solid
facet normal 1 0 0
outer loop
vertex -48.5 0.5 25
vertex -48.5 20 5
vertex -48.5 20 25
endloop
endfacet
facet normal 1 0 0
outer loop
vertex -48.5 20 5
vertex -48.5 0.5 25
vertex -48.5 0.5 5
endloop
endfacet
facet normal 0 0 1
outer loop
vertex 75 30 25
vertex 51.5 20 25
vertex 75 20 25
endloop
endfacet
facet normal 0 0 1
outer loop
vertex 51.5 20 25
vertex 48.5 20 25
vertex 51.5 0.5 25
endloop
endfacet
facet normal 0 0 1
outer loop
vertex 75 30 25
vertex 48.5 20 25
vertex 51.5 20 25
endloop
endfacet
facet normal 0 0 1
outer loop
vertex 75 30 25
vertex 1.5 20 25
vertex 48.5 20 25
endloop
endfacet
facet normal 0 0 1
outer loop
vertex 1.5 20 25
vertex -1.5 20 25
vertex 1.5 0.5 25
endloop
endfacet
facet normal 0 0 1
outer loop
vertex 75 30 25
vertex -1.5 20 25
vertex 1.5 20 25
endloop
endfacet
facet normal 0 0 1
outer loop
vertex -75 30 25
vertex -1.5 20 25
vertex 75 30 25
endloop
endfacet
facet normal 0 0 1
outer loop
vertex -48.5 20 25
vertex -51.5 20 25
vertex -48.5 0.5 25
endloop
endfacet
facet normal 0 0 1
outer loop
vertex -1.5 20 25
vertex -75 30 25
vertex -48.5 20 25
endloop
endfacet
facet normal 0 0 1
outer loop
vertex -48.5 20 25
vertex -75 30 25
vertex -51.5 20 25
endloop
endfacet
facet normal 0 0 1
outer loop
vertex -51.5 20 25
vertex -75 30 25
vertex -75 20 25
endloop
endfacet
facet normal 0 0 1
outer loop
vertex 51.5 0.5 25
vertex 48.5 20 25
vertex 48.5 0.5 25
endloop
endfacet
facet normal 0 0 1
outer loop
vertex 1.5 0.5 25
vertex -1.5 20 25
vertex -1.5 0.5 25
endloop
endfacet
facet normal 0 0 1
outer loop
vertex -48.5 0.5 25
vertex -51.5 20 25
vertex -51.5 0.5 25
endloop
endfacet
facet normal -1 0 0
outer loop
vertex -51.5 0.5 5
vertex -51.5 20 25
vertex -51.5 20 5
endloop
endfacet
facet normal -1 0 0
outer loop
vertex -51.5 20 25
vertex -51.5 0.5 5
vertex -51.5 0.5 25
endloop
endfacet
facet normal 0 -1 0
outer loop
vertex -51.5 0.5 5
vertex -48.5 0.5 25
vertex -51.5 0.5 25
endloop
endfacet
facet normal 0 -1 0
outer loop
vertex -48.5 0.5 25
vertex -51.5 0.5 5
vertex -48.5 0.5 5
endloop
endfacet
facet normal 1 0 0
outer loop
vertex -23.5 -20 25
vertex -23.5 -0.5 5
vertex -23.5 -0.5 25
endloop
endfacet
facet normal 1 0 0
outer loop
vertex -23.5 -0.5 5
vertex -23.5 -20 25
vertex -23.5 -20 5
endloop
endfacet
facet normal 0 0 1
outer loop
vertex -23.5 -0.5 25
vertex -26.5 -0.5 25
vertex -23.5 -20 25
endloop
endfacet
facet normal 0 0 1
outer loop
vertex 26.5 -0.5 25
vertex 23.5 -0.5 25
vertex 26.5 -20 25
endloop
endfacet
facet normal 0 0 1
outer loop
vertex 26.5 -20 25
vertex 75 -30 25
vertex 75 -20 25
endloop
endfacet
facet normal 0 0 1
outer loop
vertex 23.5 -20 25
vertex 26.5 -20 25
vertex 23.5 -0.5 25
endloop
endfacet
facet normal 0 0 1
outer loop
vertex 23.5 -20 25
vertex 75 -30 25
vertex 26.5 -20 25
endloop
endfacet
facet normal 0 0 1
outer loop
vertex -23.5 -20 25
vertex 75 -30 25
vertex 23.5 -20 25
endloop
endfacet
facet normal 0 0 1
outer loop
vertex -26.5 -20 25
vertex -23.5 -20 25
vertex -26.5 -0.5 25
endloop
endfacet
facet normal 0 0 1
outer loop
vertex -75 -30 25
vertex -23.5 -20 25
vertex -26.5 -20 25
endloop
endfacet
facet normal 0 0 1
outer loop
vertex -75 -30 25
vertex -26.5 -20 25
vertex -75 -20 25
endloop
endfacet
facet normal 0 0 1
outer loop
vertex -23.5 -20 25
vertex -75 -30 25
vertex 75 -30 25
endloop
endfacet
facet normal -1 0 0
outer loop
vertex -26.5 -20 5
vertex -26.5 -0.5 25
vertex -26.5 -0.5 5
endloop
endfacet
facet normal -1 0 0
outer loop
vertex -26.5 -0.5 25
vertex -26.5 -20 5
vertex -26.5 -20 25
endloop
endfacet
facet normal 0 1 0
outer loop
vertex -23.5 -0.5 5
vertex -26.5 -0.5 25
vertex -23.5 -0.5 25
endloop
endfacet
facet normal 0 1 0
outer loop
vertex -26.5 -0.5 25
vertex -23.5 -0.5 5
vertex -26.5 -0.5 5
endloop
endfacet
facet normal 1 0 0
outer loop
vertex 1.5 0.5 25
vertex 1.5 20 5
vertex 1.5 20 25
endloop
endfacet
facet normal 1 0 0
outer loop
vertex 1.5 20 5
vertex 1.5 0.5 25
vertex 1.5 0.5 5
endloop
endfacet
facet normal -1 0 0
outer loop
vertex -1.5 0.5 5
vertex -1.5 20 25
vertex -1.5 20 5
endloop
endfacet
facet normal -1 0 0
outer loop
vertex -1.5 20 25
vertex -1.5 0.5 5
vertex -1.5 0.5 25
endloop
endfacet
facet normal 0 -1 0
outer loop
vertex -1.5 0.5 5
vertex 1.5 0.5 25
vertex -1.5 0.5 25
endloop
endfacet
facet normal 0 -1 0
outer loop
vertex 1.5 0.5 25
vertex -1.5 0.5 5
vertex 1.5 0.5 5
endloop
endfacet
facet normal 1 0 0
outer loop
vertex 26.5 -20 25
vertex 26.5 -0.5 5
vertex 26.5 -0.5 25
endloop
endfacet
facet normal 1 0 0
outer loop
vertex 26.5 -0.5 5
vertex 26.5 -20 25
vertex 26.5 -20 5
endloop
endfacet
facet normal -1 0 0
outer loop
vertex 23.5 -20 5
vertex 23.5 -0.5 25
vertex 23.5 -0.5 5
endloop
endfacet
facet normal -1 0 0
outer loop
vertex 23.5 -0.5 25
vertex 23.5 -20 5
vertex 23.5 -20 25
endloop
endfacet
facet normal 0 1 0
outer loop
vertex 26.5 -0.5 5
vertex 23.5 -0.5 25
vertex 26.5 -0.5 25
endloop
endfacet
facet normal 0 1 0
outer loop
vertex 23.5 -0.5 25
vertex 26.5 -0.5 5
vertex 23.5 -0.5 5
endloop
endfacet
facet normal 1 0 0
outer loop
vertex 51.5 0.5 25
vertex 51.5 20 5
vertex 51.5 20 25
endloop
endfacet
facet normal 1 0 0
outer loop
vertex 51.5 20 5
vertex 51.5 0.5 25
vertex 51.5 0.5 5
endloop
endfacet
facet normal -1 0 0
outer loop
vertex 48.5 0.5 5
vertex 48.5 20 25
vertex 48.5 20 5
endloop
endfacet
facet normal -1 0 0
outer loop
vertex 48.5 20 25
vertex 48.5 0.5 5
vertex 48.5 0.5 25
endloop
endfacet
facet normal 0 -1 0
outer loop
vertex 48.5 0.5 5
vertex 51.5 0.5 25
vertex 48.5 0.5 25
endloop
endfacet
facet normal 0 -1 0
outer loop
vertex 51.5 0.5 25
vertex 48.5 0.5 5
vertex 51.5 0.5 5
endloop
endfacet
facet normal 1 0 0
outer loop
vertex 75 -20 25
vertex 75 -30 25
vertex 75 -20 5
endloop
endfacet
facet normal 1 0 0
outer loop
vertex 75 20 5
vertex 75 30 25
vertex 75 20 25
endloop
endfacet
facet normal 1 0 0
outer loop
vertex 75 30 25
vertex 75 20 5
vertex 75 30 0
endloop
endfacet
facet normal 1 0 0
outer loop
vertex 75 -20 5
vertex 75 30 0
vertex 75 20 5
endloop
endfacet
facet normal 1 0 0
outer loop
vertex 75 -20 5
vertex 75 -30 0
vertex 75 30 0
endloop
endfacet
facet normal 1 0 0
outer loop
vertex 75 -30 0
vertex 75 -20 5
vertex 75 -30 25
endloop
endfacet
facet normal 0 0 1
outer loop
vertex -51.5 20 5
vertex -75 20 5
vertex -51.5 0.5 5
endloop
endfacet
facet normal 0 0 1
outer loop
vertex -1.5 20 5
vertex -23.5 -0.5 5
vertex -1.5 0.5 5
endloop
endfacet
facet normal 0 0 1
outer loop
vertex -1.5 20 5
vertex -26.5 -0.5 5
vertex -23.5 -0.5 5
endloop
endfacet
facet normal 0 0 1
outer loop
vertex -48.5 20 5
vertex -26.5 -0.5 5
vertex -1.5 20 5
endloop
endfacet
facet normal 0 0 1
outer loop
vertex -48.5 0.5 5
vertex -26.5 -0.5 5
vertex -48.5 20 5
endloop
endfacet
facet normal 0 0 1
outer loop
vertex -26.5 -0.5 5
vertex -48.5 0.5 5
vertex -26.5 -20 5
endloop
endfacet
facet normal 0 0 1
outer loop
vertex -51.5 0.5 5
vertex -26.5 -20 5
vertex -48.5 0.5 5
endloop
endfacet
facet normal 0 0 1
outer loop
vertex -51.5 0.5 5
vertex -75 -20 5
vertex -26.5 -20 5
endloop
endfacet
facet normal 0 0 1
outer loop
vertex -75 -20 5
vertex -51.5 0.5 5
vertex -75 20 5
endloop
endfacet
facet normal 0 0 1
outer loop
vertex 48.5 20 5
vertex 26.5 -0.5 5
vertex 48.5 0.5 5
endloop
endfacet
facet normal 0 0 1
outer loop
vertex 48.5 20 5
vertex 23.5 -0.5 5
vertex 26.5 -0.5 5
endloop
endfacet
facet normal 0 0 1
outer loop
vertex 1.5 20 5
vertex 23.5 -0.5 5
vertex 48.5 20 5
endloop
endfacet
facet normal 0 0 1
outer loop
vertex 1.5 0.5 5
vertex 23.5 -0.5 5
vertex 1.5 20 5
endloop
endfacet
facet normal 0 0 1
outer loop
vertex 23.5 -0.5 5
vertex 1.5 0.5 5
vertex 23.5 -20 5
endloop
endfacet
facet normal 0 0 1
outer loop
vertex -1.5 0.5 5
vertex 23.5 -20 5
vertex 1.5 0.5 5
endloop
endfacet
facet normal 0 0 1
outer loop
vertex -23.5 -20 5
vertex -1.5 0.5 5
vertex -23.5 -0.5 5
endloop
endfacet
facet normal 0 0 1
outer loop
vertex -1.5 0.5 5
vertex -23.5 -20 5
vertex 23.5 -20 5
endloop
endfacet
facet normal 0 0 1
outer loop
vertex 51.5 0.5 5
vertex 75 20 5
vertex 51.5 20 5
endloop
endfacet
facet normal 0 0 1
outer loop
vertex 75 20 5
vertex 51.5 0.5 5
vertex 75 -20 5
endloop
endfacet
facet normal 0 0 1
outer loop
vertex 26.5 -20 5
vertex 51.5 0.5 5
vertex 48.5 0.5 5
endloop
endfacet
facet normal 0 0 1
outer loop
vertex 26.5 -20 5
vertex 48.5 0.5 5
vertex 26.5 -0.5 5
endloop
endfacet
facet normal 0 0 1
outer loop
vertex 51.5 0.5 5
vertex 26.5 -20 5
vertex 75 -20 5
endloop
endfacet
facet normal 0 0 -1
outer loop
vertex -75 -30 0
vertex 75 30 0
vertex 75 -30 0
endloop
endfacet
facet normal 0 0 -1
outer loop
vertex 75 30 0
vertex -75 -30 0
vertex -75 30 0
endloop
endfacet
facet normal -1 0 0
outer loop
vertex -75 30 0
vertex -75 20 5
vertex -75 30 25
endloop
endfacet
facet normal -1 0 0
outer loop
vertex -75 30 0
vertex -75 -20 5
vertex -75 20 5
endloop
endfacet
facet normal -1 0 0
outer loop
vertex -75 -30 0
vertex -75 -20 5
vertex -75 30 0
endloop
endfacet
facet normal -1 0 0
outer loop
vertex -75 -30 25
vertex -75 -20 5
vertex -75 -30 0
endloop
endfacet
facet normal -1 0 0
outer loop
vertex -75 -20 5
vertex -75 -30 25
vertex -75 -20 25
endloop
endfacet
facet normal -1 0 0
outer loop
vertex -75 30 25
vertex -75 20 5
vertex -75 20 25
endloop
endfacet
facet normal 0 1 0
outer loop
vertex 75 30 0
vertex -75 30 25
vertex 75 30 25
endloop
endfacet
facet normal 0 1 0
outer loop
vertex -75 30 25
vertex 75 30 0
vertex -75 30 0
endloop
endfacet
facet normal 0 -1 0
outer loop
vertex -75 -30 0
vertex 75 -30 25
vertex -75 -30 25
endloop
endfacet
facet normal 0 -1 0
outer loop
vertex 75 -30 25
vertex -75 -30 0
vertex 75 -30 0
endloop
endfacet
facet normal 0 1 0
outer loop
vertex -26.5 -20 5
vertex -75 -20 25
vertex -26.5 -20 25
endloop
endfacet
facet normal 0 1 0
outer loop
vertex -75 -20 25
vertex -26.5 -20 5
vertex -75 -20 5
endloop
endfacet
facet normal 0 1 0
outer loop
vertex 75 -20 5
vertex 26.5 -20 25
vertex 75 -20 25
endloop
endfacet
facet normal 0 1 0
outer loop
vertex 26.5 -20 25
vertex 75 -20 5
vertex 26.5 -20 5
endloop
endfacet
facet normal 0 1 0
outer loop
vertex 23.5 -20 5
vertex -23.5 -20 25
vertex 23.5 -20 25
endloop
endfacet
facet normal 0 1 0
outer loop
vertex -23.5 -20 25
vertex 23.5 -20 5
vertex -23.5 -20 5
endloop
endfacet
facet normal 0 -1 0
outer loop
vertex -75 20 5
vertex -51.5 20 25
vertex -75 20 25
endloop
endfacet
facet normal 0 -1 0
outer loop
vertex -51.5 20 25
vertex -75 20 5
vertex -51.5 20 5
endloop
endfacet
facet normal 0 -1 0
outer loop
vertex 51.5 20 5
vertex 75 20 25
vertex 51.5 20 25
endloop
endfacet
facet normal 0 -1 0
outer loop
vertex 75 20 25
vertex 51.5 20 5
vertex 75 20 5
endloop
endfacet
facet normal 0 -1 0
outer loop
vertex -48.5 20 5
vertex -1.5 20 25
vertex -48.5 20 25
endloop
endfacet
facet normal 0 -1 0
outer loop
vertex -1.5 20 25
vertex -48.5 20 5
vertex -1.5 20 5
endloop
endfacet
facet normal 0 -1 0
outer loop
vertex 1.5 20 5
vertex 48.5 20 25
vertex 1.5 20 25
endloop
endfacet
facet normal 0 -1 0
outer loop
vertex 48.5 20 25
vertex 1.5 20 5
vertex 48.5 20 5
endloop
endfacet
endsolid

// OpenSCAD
$fn = 32;

// ----------------------------------------------------------------------
// Rib frame 150 x 60 x 25
// 5 ribs at 25 mm pitch, staggered
// ----------------------------------------------------------------------

// --- parameters (mm) ---
frame = [150, 60, 5];  // base plate size (x, y, z)
rail_w = 10;           // side rail width
ribs = 5;              // number of ribs
rib_t = 3;             // rib thickness
rib_h = 20;            // rib height above the base plate
pitch = 25;            // pitch between rib centres

// --- derived feature positions (mm) ---
span = (ribs - 1) * pitch;          // = 100   distance between the outer ribs
origin_x = -span / 2;               // = -50   X of the first rib
rib_len = frame[1] / 2 - rail_w + 0.5;  // = 20.5   length of a staggered rib
rib_y = 0.5 + rib_len / 2;          // = 10.75   Y of a staggered rib centre
row_offset = 2 * rib_y;             // = 21.5   distance between the two rows
feature_centers = [
  [origin_x + 0 * pitch, rib_y],
  [origin_x + 1 * pitch, -rib_y],
  [origin_x + 2 * pitch, rib_y],
  [origin_x + 3 * pitch, -rib_y],
  [origin_x + 4 * pitch, rib_y]
];   // rib centre line, drives the rib loop

// base plate, two side rails, then the ribs read straight off feature_centers
union() {
  translate([-frame[0] / 2, -frame[1] / 2, 0]) cube(frame);
  translate([-frame[0] / 2, -frame[1] / 2, 0]) cube([frame[0], rail_w, frame[2] + rib_h]);
  translate([-frame[0] / 2, frame[1] / 2 - rail_w, 0]) cube([frame[0], rail_w, frame[2] + rib_h]);
  for (centre = feature_centers)
    translate([centre[0] - rib_t / 2, centre[1] - rib_len / 2, frame[2] - 1])
      cube([rib_t, rib_len, rib_h + 1]);
}
